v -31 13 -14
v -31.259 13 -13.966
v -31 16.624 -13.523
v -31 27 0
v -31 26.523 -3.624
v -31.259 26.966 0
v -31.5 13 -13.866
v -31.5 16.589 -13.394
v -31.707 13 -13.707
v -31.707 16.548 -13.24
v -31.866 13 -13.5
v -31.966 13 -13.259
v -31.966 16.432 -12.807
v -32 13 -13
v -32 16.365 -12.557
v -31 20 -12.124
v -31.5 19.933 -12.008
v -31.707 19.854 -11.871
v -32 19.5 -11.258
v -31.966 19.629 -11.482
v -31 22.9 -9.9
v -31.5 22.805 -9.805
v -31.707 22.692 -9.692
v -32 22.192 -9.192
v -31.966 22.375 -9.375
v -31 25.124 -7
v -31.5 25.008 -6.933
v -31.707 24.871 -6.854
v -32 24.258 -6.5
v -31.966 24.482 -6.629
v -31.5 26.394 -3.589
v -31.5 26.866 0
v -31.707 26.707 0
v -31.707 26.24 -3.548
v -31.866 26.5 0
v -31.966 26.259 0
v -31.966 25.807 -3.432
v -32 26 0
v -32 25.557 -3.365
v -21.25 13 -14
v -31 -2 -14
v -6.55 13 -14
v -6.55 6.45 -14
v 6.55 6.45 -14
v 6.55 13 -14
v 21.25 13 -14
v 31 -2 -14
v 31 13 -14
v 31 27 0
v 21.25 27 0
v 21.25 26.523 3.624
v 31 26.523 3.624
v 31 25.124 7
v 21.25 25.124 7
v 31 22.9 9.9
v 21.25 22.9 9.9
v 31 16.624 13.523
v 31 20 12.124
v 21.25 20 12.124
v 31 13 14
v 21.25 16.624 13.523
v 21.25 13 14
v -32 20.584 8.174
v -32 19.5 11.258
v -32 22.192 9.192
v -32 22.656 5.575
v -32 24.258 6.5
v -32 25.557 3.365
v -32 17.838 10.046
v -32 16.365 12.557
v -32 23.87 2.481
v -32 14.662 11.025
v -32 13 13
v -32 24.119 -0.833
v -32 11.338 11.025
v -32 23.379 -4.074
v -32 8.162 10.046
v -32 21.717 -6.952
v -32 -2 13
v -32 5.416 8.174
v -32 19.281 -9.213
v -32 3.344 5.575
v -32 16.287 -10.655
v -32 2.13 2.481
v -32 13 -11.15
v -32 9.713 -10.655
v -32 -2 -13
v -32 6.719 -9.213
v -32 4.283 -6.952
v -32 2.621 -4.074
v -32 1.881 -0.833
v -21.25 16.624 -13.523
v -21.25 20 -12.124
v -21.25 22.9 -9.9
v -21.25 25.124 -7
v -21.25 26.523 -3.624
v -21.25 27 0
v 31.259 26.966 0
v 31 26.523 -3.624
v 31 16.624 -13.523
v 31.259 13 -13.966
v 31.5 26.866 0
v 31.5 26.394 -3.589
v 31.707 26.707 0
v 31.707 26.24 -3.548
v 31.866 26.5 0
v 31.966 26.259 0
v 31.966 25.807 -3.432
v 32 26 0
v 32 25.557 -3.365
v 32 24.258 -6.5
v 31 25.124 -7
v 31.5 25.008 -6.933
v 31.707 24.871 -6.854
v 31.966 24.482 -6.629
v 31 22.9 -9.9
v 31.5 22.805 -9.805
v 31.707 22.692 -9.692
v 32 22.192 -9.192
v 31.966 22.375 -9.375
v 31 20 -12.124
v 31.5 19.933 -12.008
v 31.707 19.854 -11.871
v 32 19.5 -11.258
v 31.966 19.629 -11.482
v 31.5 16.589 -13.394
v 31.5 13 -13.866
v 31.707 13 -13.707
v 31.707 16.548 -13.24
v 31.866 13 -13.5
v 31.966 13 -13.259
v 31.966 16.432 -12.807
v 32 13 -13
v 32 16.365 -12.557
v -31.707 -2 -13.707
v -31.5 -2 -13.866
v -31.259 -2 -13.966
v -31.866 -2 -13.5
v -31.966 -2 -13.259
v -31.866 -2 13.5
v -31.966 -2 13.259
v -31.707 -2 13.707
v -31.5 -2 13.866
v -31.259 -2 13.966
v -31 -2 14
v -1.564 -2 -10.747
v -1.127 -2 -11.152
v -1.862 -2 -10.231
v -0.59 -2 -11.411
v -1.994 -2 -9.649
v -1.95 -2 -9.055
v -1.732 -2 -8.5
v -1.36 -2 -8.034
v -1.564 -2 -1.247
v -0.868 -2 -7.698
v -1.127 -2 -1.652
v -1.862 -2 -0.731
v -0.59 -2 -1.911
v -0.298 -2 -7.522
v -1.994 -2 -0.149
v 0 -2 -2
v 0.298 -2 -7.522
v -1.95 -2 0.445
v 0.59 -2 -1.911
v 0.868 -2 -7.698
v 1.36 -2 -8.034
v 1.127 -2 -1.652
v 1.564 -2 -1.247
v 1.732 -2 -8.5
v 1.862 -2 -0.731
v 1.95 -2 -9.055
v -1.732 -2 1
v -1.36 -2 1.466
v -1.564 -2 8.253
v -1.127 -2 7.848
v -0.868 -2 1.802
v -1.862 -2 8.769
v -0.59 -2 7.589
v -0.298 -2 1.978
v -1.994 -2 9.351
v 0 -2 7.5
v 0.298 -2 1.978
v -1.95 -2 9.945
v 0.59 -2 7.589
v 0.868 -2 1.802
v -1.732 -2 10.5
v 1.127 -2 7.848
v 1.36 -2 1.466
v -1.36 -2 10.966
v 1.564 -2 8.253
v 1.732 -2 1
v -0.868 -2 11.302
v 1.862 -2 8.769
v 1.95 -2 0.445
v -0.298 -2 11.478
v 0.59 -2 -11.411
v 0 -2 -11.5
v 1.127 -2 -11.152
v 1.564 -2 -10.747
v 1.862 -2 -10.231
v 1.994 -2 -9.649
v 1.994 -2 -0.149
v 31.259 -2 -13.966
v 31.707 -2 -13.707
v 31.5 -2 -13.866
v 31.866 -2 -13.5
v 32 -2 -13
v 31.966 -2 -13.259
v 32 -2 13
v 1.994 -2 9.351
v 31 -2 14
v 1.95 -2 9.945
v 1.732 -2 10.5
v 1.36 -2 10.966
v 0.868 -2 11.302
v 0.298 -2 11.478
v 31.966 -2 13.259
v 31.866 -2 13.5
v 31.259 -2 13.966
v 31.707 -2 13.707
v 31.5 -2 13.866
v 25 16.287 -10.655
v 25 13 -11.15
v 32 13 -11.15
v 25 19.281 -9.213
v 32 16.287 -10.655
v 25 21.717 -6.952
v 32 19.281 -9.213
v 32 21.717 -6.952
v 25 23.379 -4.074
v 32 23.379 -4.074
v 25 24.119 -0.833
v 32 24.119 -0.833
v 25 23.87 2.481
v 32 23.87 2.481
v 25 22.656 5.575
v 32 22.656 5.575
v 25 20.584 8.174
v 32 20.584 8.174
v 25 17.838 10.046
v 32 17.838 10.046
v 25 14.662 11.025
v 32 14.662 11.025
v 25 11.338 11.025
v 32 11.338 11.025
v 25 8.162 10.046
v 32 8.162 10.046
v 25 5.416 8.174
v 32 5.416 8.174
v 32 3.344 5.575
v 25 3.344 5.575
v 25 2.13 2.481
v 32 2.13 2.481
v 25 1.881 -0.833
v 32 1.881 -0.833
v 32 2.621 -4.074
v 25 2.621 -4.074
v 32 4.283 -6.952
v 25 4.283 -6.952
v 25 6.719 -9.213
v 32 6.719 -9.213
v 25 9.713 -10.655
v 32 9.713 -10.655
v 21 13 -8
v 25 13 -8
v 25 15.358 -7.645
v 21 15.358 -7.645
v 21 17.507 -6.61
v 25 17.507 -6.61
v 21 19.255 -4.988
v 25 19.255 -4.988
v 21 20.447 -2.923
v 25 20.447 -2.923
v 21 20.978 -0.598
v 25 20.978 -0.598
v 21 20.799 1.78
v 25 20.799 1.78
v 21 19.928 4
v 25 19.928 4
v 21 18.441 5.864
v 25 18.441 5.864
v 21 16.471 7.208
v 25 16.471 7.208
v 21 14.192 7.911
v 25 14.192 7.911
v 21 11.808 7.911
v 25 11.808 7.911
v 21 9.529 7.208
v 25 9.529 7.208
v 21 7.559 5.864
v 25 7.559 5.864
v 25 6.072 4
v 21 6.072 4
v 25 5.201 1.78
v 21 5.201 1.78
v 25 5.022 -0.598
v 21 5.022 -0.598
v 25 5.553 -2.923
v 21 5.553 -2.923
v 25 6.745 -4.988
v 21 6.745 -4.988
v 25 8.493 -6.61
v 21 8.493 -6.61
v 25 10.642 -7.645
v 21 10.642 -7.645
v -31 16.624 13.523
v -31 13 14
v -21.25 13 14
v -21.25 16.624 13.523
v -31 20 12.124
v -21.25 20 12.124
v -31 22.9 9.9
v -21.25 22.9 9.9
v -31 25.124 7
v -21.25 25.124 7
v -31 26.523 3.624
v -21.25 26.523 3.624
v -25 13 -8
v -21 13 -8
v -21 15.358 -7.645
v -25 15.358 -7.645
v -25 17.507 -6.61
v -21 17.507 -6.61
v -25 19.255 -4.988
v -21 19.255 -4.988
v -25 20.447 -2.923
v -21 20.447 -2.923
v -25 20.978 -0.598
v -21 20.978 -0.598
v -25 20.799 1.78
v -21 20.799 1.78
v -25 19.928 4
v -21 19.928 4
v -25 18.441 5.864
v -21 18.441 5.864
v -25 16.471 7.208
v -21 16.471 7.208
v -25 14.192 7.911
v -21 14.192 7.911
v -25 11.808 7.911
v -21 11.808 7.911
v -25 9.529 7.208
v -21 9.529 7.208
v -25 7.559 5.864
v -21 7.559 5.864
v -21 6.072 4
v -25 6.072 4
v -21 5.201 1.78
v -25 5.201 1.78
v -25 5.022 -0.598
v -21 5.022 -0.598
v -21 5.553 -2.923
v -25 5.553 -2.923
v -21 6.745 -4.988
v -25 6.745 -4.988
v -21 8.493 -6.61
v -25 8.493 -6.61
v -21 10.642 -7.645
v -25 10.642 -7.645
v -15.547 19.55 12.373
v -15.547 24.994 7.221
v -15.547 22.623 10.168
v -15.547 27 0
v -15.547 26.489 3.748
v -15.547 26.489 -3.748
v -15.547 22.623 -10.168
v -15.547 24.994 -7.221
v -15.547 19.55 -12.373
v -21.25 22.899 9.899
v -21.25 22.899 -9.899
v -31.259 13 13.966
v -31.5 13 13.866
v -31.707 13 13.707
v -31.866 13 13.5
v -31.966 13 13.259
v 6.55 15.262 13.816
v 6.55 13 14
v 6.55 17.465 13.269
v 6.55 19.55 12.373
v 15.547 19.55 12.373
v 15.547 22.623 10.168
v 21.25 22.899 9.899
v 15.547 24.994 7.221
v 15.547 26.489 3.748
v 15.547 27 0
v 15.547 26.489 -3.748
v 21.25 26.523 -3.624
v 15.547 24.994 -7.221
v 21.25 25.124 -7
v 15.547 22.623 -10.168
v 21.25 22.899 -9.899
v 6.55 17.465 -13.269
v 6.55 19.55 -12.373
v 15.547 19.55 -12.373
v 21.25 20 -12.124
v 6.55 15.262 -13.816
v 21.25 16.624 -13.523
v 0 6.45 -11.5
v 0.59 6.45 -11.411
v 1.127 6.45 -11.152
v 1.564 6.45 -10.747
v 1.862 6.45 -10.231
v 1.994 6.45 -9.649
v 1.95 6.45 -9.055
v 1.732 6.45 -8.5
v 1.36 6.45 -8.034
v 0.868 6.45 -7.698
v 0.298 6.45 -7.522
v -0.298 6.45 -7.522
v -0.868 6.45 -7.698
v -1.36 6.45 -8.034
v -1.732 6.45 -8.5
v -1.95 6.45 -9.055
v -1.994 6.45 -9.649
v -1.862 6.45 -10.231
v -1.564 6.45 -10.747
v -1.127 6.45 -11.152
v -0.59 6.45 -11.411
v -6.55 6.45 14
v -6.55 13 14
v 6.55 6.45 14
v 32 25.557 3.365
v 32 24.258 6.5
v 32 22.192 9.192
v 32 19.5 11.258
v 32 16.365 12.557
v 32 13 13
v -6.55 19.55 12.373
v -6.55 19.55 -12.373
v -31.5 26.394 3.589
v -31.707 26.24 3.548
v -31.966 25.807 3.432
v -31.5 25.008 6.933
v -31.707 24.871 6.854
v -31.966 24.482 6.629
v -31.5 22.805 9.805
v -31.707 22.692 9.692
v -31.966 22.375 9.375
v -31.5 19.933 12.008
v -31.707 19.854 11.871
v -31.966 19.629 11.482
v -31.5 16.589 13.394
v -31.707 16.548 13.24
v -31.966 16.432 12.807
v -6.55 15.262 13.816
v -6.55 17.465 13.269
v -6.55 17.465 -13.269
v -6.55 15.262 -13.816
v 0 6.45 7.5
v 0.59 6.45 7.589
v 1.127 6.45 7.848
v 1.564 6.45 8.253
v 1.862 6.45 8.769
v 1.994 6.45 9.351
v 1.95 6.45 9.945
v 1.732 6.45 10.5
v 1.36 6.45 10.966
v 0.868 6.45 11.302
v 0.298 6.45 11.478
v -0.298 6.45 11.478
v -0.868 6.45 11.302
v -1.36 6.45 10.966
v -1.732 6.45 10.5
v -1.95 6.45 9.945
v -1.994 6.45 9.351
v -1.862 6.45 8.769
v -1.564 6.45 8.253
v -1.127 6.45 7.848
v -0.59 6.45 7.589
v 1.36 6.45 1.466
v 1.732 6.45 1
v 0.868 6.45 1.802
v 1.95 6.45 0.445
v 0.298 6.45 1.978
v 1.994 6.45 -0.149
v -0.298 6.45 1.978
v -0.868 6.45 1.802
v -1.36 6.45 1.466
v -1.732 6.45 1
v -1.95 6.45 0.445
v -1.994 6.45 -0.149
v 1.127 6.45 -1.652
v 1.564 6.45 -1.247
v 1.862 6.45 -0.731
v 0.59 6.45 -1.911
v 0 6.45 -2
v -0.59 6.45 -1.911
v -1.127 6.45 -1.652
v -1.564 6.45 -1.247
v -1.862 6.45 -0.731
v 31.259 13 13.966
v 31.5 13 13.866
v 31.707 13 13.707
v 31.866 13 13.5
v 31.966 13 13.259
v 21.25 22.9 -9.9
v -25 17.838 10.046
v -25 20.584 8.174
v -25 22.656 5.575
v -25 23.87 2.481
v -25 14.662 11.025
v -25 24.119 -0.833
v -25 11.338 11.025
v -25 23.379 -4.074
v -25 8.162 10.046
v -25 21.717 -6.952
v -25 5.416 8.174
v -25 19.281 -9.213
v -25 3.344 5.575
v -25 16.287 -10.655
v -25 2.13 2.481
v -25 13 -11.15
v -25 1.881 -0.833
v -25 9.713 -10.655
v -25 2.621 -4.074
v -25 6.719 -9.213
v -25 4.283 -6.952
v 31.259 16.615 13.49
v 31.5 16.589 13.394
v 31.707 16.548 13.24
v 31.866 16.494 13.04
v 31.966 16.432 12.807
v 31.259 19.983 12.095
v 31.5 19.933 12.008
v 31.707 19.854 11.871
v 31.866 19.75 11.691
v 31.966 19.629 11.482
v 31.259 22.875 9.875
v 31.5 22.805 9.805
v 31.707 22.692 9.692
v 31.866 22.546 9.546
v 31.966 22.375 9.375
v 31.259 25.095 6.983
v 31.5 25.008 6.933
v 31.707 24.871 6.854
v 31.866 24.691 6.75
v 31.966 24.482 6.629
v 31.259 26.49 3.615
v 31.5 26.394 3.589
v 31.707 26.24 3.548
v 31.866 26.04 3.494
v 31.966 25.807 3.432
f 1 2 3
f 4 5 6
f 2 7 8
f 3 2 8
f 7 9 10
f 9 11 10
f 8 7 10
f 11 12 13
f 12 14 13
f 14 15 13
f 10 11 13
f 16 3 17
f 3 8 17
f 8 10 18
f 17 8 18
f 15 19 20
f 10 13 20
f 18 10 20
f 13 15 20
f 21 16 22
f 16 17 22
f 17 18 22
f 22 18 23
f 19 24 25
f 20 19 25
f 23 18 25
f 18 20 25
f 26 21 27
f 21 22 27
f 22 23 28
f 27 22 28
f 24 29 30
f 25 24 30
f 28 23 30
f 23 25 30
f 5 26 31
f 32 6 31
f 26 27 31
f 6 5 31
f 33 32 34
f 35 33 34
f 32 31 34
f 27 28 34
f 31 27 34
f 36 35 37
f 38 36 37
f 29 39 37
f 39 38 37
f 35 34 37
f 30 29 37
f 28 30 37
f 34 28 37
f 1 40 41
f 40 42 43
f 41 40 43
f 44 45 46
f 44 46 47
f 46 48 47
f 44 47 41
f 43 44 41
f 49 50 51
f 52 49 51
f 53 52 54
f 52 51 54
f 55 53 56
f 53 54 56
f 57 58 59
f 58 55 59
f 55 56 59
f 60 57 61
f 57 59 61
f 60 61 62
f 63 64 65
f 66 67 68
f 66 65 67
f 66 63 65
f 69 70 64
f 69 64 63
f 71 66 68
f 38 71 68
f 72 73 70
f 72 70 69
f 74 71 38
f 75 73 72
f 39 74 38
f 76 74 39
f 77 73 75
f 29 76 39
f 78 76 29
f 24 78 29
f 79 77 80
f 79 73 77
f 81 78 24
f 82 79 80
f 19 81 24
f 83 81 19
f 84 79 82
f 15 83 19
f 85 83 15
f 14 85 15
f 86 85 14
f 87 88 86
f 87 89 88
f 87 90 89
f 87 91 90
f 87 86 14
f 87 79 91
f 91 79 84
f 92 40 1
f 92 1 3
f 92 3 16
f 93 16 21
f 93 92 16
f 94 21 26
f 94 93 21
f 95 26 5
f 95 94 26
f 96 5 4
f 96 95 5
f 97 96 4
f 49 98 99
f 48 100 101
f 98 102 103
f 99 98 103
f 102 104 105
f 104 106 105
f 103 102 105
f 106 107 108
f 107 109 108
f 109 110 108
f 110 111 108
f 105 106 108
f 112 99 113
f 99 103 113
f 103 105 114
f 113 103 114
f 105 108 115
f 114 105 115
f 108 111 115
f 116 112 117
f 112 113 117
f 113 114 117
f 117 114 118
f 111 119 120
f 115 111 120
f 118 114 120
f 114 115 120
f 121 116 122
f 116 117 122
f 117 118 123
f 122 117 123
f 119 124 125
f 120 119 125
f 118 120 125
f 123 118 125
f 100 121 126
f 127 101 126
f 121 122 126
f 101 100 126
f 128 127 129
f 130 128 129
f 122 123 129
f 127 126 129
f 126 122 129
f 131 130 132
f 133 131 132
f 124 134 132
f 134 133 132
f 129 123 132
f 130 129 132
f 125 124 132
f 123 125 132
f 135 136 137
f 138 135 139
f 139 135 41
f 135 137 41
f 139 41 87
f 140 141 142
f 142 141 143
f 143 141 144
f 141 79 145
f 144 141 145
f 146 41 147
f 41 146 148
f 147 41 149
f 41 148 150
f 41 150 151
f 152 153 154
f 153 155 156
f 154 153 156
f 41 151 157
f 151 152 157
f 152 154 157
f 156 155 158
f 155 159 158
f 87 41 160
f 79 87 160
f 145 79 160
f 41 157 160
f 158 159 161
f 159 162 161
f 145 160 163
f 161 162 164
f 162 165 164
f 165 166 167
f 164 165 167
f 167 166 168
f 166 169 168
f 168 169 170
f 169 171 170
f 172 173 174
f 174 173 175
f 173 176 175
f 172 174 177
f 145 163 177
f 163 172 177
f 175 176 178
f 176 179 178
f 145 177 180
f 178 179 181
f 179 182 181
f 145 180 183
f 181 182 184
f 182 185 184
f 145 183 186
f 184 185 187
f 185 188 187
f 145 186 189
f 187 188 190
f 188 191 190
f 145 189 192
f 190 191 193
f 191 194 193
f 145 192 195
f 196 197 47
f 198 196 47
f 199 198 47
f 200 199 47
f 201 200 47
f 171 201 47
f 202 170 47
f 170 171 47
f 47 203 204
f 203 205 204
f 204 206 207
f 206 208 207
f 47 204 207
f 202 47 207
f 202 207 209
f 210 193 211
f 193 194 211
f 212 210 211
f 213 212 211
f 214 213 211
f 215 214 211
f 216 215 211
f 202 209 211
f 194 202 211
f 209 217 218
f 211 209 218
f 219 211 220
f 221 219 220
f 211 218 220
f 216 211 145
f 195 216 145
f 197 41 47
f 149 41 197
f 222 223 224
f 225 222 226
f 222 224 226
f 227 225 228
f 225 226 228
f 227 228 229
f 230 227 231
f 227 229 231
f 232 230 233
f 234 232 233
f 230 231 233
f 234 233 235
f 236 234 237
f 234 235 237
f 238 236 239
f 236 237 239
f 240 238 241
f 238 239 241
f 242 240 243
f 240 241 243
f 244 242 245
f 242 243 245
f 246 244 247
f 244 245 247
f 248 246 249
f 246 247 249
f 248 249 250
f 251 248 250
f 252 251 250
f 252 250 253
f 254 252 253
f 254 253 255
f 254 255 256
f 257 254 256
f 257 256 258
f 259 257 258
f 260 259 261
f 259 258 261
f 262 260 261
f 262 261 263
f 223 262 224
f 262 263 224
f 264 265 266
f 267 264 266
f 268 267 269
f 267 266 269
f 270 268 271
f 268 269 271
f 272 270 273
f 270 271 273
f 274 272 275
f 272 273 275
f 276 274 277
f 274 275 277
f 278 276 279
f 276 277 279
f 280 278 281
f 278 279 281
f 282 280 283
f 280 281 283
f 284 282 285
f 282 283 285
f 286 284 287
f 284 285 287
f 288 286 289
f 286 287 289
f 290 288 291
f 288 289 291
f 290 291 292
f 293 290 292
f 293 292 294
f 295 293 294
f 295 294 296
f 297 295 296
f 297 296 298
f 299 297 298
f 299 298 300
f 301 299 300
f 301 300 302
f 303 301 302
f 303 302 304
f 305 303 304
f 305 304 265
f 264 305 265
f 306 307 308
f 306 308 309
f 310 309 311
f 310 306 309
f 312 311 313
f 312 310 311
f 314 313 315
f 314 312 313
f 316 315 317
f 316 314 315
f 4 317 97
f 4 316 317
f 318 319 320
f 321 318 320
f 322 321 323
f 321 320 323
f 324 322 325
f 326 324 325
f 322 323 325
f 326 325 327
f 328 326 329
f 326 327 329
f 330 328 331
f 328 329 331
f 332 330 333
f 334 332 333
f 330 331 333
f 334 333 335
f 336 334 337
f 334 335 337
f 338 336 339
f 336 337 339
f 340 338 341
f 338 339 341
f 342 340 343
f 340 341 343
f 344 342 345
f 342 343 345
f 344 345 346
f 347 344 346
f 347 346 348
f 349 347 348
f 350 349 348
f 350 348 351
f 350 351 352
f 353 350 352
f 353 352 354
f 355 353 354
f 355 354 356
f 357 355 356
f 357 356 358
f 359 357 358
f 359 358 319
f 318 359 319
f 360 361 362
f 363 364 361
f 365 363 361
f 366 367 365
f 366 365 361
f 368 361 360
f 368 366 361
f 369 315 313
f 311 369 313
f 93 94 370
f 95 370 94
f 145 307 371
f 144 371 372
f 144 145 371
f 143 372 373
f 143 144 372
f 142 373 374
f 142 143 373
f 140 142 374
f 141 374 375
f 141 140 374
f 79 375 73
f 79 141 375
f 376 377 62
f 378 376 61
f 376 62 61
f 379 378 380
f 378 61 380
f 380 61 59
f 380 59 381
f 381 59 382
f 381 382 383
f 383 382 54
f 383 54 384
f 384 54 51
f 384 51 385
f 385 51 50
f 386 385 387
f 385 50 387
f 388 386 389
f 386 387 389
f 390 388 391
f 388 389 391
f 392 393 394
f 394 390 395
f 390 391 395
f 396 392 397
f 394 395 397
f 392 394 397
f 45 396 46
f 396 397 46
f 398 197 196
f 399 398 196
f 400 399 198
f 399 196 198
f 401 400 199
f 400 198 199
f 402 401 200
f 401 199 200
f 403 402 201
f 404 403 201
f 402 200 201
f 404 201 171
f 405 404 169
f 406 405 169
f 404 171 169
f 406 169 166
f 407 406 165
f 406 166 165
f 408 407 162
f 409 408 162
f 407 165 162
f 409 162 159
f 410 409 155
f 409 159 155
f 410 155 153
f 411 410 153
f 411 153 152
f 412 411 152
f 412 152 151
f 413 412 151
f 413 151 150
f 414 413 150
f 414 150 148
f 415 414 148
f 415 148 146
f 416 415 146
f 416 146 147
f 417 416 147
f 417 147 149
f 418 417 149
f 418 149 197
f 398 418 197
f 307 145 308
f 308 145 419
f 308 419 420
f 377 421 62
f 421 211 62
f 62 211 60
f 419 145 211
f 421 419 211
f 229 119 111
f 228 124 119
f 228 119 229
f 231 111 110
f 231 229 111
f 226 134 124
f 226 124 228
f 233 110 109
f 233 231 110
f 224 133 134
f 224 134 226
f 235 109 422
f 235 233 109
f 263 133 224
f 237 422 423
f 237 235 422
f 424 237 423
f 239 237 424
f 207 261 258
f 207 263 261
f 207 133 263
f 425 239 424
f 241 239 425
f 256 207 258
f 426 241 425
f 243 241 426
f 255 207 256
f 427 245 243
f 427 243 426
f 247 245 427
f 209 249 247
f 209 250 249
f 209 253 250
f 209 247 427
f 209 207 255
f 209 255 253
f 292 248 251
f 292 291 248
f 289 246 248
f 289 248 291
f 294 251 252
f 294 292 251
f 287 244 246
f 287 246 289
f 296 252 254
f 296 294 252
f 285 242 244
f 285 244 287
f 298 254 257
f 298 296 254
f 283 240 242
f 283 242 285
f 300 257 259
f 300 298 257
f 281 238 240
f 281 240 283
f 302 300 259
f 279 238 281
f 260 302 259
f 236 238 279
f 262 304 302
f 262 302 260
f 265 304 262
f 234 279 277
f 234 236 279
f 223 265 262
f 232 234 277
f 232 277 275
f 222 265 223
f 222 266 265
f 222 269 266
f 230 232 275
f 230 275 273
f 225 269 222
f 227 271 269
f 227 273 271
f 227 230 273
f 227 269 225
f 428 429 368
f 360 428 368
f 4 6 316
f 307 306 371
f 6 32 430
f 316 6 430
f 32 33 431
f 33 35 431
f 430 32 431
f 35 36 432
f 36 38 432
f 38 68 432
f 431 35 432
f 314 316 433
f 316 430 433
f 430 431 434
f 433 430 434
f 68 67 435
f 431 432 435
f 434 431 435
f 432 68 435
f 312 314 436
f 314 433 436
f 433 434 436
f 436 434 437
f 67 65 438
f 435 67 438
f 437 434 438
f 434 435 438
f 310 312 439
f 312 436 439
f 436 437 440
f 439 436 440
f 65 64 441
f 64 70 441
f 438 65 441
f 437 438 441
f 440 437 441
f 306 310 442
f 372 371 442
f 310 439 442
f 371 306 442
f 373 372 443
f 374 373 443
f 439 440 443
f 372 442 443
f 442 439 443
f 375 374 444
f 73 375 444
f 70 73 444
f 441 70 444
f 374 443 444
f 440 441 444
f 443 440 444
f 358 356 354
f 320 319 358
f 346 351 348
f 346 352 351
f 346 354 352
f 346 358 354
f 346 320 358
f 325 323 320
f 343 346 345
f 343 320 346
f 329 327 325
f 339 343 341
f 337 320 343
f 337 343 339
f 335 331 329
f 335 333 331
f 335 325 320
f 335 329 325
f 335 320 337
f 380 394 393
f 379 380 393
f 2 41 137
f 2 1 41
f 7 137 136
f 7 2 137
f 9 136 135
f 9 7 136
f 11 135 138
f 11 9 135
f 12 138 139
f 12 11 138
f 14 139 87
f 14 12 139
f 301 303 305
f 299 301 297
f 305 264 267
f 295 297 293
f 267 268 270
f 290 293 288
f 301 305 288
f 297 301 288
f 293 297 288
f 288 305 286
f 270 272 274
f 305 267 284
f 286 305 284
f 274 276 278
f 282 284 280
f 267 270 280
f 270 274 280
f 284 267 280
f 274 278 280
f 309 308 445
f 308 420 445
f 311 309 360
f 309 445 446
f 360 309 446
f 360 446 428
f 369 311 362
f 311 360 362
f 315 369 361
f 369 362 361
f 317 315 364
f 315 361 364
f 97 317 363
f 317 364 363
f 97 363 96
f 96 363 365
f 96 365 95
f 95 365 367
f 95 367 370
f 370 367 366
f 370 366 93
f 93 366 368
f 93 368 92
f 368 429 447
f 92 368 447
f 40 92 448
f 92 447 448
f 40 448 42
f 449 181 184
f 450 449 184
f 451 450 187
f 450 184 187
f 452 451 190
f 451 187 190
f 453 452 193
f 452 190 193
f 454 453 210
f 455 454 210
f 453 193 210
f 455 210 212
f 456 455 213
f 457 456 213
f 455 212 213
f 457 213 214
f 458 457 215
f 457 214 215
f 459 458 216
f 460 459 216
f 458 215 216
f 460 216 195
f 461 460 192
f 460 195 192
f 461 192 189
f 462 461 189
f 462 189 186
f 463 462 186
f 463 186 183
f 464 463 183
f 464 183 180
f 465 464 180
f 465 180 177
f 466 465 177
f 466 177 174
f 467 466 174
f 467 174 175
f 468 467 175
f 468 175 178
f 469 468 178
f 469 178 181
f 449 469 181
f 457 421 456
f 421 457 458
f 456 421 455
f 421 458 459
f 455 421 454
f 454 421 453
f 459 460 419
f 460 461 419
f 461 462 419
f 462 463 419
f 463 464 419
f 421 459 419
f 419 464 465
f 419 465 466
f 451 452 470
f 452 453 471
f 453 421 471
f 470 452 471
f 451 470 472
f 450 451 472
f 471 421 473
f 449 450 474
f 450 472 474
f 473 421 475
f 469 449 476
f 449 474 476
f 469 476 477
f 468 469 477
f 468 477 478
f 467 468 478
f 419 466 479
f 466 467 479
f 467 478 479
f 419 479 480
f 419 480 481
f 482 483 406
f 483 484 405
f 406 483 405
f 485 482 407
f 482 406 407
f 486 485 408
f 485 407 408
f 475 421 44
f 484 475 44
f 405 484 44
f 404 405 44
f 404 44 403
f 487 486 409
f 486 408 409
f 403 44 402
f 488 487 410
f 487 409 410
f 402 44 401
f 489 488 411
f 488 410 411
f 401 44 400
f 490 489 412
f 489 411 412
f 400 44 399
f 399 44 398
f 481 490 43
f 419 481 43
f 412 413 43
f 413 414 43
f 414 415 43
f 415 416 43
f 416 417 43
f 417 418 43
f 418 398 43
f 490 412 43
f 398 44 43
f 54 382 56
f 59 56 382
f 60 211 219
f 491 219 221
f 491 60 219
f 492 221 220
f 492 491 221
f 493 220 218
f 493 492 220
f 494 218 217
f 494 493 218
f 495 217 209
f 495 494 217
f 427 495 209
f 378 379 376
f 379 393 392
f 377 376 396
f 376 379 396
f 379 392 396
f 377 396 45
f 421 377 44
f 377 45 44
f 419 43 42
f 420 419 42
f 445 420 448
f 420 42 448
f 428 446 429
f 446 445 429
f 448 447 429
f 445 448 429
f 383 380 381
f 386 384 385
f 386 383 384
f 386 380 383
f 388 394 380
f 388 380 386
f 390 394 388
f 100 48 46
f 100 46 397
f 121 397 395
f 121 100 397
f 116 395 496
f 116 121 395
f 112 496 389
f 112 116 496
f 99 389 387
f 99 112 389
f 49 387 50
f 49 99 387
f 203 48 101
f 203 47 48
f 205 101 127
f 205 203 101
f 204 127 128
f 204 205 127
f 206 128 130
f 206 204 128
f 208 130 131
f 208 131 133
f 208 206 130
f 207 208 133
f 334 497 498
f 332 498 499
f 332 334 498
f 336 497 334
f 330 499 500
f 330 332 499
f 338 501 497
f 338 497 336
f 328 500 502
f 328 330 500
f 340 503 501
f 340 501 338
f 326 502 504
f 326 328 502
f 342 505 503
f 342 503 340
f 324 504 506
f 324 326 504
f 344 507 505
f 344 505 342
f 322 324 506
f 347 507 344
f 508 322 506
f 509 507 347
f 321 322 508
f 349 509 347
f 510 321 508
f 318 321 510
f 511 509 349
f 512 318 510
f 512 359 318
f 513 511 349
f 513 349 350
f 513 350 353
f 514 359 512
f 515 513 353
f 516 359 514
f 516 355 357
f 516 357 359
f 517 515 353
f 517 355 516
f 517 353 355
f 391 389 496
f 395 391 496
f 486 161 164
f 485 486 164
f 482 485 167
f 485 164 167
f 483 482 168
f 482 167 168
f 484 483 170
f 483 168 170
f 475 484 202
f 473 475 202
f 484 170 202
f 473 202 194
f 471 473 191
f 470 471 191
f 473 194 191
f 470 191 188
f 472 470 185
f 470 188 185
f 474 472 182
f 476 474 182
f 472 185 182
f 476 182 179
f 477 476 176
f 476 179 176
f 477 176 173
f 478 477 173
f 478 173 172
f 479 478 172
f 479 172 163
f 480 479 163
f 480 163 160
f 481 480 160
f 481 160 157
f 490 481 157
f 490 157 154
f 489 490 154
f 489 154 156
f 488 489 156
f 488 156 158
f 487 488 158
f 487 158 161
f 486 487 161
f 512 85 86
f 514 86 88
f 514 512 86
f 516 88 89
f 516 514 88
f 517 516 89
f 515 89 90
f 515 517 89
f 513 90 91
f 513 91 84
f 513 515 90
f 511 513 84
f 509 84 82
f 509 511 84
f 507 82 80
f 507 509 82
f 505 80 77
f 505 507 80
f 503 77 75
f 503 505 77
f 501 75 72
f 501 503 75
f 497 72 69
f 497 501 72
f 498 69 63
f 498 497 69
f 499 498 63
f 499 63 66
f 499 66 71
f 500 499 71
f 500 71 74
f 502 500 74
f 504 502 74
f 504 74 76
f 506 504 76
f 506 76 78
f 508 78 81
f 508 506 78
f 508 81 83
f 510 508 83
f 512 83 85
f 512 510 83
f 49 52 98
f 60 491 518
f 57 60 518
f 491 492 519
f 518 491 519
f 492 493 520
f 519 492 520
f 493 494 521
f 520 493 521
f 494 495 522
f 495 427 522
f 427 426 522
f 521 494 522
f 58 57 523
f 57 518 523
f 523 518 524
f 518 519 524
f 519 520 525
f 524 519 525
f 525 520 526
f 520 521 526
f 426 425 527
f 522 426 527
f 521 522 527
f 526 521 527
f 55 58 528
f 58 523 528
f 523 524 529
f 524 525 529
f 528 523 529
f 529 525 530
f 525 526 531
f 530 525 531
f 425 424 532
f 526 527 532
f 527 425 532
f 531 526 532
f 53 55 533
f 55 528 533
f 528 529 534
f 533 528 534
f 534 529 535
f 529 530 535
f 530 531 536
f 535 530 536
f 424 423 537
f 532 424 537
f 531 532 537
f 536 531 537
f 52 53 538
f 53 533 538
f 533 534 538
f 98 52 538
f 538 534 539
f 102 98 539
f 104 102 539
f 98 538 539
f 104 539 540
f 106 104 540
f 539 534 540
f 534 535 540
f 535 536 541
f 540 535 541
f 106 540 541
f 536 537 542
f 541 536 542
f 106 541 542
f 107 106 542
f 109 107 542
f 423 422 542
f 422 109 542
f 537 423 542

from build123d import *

# Parameters (mm, degrees)
SKETCH1_R                       = 26
SKETCH1_R_2                     = 21.249999999999996
BOSS_EXTRUDE1_DEPTH             = 9
BOSS_EXTRUDE2_START             = 2
SKETCH2_R                       = 26.000000000000007
SKETCH2_R_2                     = 21.249999999999996
BOSS_EXTRUDE2_DEPTH             = 2
BOSS_EXTRUDE3_REACH             = 40.38
BOSS_EXTRUDE3_DIRECTION_2_DEPTH = 18
SKETCH4_R                       = 11.15
CUT_EXTRUDE1_DEPTH              = 7
CUT_EXTRUDE2_START              = -7
SKETCH5_R                       = 11.15
CUT_EXTRUDE2_DEPTH              = 7
FILLET2_R                       = 14
FILLET4_R                       = 1
SKETCH8_W                       = 43.8178046004133
SKETCH8_H                       = 27.999999999999993
BOSS_EXTRUDE4_DEPTH             = 11
SKETCH9_W                       = 43.8178046004133
SKETCH9_H                       = 11.999999999999998
CUT_EXTRUDE4_DEPTH              = 45.988887516807985
BOSS_EXTRUDE5_DEPTH             = 42.5
SKETCH6_R                       = 8
CUT_EXTRUDE3_DEPTH              = 65.6065012208524
BOSS_EXTRUDE6_START             = -4
BOSS_EXTRUDE6_DEPTH             = 42
SKETCH11_R                      = 2
CUT_EXTRUDE5_DEPTH              = 46.39823785126468
CUT_EXTRUDE6_DEPTH              = 51.36864114704705


with BuildPart() as part:
    # Sketch1 → Boss-Extrude1 (new body)
    with BuildSketch(Plane(origin=(0, 0, 0), x_dir=(1, 0, 0), z_dir=(0, 1, 0))):
        with Locations(Location((0, 0, 0), (0, 0, 270))):
            Circle(SKETCH1_R)
        with Locations(Location((0, 0, 0), (0, 0, 270))):
            Circle(SKETCH1_R_2, mode=Mode.SUBTRACT)
    extrude(amount=BOSS_EXTRUDE1_DEPTH)

    # Sketch2 → Boss-Extrude2 (add)
    with BuildSketch(Plane.XZ.offset(BOSS_EXTRUDE2_START)):
        with Locations(Location((0, 0, 0), (0, 0, 270))):
            Circle(SKETCH2_R)
        with Locations(Location((0, 0, 0), (0, 0, 270))):
            Circle(SKETCH2_R_2, mode=Mode.SUBTRACT)
    extrude(amount=-BOSS_EXTRUDE2_DEPTH)

    # Boss-Extrude3: up to this face of the body (flat: up to its plane)
    boss_extrude3_end = Plane(part.part.faces().sort_by_distance((0, -2, 25.264608948))[0])
    # Sketch3 → Boss-Extrude3 (add, up to the picked face)
    with BuildSketch(Plane(origin=(0, 9, 0), x_dir=(1, 0, 0), z_dir=(0, 1, 0)), mode=Mode.PRIVATE) as boss_extrude3_sk1:
        Polygon((21.249999999999996, 14.000000000000002), (32, 14.000000000000002), (32.00000000000001, -13.999999999999998), (21.250000000000004, -13.999999999999998), align=None)
    boss_extrude3_tool1 = split(extrude(boss_extrude3_sk1.sketch, amount=-BOSS_EXTRUDE3_REACH, mode=Mode.PRIVATE), bisect_by=boss_extrude3_end, keep=Keep.BOTH, mode=Mode.PRIVATE)
    # Sketch3 → Boss-Extrude3 (add, up to the picked face)
    with BuildSketch(Plane(origin=(0, 9, 0), x_dir=(1, 0, 0), z_dir=(0, 1, 0)), mode=Mode.PRIVATE) as boss_extrude3_sk2:
        Polygon((-32, 13.999999999999995), (-21.25, 13.999999999999995), (-21.250000000000004, -14.000000000000005), (-32, -14.000000000000004), align=None)
    boss_extrude3_tool2 = split(extrude(boss_extrude3_sk2.sketch, amount=-BOSS_EXTRUDE3_REACH, mode=Mode.PRIVATE), bisect_by=boss_extrude3_end, keep=Keep.BOTH, mode=Mode.PRIVATE)
    add(boss_extrude3_tool1.solids().sort_by(Axis((26.625, 9, 0), (0, -1, 0)))[0])
    add(boss_extrude3_tool2.solids().sort_by(Axis((-26.625, 9, 0), (0, -1, 0)))[0])

    # Sketch3 → Boss-Extrude3 direction 2 (add)
    with BuildSketch(Plane(origin=(0, 9, 0), x_dir=(1, 0, 0), z_dir=(0, 1, 0))):
        Polygon((21.249999999999996, 14.000000000000002), (32, 14.000000000000002), (32.00000000000001, -13.999999999999998), (21.250000000000004, -13.999999999999998), align=None)
        Polygon((-32, 13.999999999999995), (-21.25, 13.999999999999995), (-21.250000000000004, -14.000000000000005), (-32, -14.000000000000004), align=None)
    extrude(amount=BOSS_EXTRUDE3_DIRECTION_2_DEPTH)

    # Sketch4 → Cut-Extrude1 (cut)
    with BuildSketch(Plane(origin=(32.00000000000001, 0, -7.93e-15), x_dir=(-2.8e-16, 0, -1), z_dir=(1, 0, -2.8e-16))):
        with Locations((0, 12.999999999999998)):
            Circle(SKETCH4_R)
    extrude(amount=-CUT_EXTRUDE1_DEPTH, mode=Mode.SUBTRACT)

    # Sketch5 → Cut-Extrude2 (cut)
    with BuildSketch(Plane.ZY.offset(32).offset(CUT_EXTRUDE2_START)):
        with Locations(Location((-7.93e-15, 12.999999999999998, 0), (0, 0, 180))):
            Circle(SKETCH5_R)
    extrude(amount=CUT_EXTRUDE2_DEPTH, mode=Mode.SUBTRACT)

    # Fillet2
    fillet2_edges = [part.edges().sort_by_distance(p)[0] for p in [
        (-26.625, 27, 14.000000000000004),
        (-26.625, 27, -13.999999999999995),
        (26.625, 27, -14.000000000000002),
        (26.625000000000007, 27, 13.999999999999998),
    ]]
    fillet(fillet2_edges, radius=FILLET2_R - 0.0001)  # a hair under: the kernel refuses the full size

    # Fillet4
    fillet4_edges = [part.edges().sort_by_distance(p)[0] for p in [
        (-32, 3.5, 14.000000000000004),
        (-32, 3.5, -13.999999999999995),
        (-32, 22.89952422593355, -9.899524225933543),
        (-32, 22.899524225933547, 9.899524225933554),
        (32, 5.500050000000002, -14.000000000000004),
        (32.00000000000001, 5.500050000000002, 14),
        (32, 22.899524225933547, 9.89952422593355),
        (32, 22.89952422593355, -9.89952422593355),
    ]]
    fillet(fillet4_edges, radius=FILLET4_R)

    # Sketch8 → Boss-Extrude4 (add)
    with BuildSketch(Plane.XZ.offset(2)):
        Rectangle(SKETCH8_W, SKETCH8_H)
    extrude(amount=-BOSS_EXTRUDE4_DEPTH)

    # Sketch9 → Cut-Extrude4 (cut, through all)
    with BuildSketch(Plane(origin=(0, 9, 0), x_dir=(1, 0, 0), z_dir=(0, 1, 0))):
        Polygon((21.90890230020665, 14.000000000000002), (-21.908902300206655, 14.000000000000002), (-21.908902300206652, 25.999999999999996), (21.908902300206652, 25.999999999999996), align=None)
        with Locations((0, -20.000000000000004)):
            Rectangle(SKETCH9_W, SKETCH9_H)
    extrude(amount=-CUT_EXTRUDE4_DEPTH, mode=Mode.SUBTRACT)

    # Sketch12 → Boss-Extrude5 (add)
    with BuildSketch(Plane.ZY.offset(-21.25)):
        with BuildLine():
            Line((-13.999999999999996, 12.999999999999998), (-13.999999999999996, 9.000000000000002))
            Line((-13.999999999999996, 9.000000000000002), (14.00000000000001, 9))
            Line((14.00000000000001, 9), (14.000000000000004, 12.999999999999996))
            ThreePointArc((14.000000000000004, 12.999999999999996), (9.89949493661167, 22.89949493661166), (6.12e-15, 26.999999999999996))
            ThreePointArc((6.12e-15, 26.999999999999996), (-9.899494936611658, 22.89949493661166), (-13.999999999999996, 12.999999999999998))
        make_face()
    extrude(amount=BOSS_EXTRUDE5_DEPTH)

    # Sketch6 → Cut-Extrude3 (cut, through all)
    with BuildSketch(Plane(origin=(25.000000000000007, 0, -6.94e-15), x_dir=(-2.8e-16, 0, -1), z_dir=(1, 0, -2.8e-16))):
        with Locations((0, 12.999999999999998)):
            Circle(SKETCH6_R)
    extrude(amount=-CUT_EXTRUDE3_DEPTH, mode=Mode.SUBTRACT)

    # Sketch14 → Boss-Extrude6 (add)
    with BuildSketch(Plane(origin=(25.000000000000007, 0, -6.94e-15), x_dir=(-2.8e-16, 0, -1), z_dir=(1, 0, -2.8e-16)).offset(BOSS_EXTRUDE6_START)):
        with BuildLine():
            Line((-14.000000000000007, -2.0000000000000018), (-14.000000000000007, 12.999999999999996))
            ThreePointArc((-14.000000000000007, 12.999999999999996), (-9.899494936611672, 22.89949493661166), (-8.6e-15, 26.999999999999996))
            ThreePointArc((-8.6e-15, 26.999999999999996), (9.899494936611658, 22.89949493661166), (13.999999999999993, 12.999999999999996))
            Line((13.999999999999993, 12.999999999999996), (13.999999999999993, -2.0000000000000018))
            Line((13.999999999999993, -2.0000000000000018), (-14.000000000000007, -2.0000000000000018))
        make_face()
    extrude(amount=-BOSS_EXTRUDE6_DEPTH)

    # Sketch11 → Cut-Extrude5 (cut, through all)
    with BuildSketch(Plane.XZ.offset(2)):
        with Locations(Location((0, -9.5, 0), (0, 0, 270))):
            Circle(SKETCH11_R)
        with Locations(Location((0, 9.5, 0), (0, 0, 270))):
            Circle(SKETCH11_R)
        with Locations(Location((1.73e-15, -3.47e-15, 0), (0, 0, 270))):
            Circle(SKETCH11_R)
    extrude(amount=-CUT_EXTRUDE5_DEPTH, mode=Mode.SUBTRACT)

    # Sketch13 → Cut-Extrude6 (cut, through all)
    with BuildSketch(Plane(origin=(0, 0, -13.999999999999995), x_dir=(-1, 0, 0), z_dir=(0, 0, -1))):
        Polygon((15.547241809262866, 33.06287004539835), (15.54724180926287, 19.549999999999997), (0, 19.549999999999997), (-15.54724180926287, 19.549999999999994), (-15.54724180926287, 33.06287004539835), align=None)
        Polygon((6.549999999999999, 19.549999999999997), (0, 19.549999999999997), (-6.550000000000001, 19.549999999999997), (-6.55, 12.999999999999996), (6.550000000000001, 12.999999999999996), align=None)
        Polygon((6.550000000000001, 6.4499999999999975), (6.55, 12.999999999999996), (-6.549999999999997, 12.999999999999996), (-6.549999999999999, 6.4499999999999975), align=None)
    extrude(amount=-CUT_EXTRUDE6_DEPTH, mode=Mode.SUBTRACT)


solid = part.part
